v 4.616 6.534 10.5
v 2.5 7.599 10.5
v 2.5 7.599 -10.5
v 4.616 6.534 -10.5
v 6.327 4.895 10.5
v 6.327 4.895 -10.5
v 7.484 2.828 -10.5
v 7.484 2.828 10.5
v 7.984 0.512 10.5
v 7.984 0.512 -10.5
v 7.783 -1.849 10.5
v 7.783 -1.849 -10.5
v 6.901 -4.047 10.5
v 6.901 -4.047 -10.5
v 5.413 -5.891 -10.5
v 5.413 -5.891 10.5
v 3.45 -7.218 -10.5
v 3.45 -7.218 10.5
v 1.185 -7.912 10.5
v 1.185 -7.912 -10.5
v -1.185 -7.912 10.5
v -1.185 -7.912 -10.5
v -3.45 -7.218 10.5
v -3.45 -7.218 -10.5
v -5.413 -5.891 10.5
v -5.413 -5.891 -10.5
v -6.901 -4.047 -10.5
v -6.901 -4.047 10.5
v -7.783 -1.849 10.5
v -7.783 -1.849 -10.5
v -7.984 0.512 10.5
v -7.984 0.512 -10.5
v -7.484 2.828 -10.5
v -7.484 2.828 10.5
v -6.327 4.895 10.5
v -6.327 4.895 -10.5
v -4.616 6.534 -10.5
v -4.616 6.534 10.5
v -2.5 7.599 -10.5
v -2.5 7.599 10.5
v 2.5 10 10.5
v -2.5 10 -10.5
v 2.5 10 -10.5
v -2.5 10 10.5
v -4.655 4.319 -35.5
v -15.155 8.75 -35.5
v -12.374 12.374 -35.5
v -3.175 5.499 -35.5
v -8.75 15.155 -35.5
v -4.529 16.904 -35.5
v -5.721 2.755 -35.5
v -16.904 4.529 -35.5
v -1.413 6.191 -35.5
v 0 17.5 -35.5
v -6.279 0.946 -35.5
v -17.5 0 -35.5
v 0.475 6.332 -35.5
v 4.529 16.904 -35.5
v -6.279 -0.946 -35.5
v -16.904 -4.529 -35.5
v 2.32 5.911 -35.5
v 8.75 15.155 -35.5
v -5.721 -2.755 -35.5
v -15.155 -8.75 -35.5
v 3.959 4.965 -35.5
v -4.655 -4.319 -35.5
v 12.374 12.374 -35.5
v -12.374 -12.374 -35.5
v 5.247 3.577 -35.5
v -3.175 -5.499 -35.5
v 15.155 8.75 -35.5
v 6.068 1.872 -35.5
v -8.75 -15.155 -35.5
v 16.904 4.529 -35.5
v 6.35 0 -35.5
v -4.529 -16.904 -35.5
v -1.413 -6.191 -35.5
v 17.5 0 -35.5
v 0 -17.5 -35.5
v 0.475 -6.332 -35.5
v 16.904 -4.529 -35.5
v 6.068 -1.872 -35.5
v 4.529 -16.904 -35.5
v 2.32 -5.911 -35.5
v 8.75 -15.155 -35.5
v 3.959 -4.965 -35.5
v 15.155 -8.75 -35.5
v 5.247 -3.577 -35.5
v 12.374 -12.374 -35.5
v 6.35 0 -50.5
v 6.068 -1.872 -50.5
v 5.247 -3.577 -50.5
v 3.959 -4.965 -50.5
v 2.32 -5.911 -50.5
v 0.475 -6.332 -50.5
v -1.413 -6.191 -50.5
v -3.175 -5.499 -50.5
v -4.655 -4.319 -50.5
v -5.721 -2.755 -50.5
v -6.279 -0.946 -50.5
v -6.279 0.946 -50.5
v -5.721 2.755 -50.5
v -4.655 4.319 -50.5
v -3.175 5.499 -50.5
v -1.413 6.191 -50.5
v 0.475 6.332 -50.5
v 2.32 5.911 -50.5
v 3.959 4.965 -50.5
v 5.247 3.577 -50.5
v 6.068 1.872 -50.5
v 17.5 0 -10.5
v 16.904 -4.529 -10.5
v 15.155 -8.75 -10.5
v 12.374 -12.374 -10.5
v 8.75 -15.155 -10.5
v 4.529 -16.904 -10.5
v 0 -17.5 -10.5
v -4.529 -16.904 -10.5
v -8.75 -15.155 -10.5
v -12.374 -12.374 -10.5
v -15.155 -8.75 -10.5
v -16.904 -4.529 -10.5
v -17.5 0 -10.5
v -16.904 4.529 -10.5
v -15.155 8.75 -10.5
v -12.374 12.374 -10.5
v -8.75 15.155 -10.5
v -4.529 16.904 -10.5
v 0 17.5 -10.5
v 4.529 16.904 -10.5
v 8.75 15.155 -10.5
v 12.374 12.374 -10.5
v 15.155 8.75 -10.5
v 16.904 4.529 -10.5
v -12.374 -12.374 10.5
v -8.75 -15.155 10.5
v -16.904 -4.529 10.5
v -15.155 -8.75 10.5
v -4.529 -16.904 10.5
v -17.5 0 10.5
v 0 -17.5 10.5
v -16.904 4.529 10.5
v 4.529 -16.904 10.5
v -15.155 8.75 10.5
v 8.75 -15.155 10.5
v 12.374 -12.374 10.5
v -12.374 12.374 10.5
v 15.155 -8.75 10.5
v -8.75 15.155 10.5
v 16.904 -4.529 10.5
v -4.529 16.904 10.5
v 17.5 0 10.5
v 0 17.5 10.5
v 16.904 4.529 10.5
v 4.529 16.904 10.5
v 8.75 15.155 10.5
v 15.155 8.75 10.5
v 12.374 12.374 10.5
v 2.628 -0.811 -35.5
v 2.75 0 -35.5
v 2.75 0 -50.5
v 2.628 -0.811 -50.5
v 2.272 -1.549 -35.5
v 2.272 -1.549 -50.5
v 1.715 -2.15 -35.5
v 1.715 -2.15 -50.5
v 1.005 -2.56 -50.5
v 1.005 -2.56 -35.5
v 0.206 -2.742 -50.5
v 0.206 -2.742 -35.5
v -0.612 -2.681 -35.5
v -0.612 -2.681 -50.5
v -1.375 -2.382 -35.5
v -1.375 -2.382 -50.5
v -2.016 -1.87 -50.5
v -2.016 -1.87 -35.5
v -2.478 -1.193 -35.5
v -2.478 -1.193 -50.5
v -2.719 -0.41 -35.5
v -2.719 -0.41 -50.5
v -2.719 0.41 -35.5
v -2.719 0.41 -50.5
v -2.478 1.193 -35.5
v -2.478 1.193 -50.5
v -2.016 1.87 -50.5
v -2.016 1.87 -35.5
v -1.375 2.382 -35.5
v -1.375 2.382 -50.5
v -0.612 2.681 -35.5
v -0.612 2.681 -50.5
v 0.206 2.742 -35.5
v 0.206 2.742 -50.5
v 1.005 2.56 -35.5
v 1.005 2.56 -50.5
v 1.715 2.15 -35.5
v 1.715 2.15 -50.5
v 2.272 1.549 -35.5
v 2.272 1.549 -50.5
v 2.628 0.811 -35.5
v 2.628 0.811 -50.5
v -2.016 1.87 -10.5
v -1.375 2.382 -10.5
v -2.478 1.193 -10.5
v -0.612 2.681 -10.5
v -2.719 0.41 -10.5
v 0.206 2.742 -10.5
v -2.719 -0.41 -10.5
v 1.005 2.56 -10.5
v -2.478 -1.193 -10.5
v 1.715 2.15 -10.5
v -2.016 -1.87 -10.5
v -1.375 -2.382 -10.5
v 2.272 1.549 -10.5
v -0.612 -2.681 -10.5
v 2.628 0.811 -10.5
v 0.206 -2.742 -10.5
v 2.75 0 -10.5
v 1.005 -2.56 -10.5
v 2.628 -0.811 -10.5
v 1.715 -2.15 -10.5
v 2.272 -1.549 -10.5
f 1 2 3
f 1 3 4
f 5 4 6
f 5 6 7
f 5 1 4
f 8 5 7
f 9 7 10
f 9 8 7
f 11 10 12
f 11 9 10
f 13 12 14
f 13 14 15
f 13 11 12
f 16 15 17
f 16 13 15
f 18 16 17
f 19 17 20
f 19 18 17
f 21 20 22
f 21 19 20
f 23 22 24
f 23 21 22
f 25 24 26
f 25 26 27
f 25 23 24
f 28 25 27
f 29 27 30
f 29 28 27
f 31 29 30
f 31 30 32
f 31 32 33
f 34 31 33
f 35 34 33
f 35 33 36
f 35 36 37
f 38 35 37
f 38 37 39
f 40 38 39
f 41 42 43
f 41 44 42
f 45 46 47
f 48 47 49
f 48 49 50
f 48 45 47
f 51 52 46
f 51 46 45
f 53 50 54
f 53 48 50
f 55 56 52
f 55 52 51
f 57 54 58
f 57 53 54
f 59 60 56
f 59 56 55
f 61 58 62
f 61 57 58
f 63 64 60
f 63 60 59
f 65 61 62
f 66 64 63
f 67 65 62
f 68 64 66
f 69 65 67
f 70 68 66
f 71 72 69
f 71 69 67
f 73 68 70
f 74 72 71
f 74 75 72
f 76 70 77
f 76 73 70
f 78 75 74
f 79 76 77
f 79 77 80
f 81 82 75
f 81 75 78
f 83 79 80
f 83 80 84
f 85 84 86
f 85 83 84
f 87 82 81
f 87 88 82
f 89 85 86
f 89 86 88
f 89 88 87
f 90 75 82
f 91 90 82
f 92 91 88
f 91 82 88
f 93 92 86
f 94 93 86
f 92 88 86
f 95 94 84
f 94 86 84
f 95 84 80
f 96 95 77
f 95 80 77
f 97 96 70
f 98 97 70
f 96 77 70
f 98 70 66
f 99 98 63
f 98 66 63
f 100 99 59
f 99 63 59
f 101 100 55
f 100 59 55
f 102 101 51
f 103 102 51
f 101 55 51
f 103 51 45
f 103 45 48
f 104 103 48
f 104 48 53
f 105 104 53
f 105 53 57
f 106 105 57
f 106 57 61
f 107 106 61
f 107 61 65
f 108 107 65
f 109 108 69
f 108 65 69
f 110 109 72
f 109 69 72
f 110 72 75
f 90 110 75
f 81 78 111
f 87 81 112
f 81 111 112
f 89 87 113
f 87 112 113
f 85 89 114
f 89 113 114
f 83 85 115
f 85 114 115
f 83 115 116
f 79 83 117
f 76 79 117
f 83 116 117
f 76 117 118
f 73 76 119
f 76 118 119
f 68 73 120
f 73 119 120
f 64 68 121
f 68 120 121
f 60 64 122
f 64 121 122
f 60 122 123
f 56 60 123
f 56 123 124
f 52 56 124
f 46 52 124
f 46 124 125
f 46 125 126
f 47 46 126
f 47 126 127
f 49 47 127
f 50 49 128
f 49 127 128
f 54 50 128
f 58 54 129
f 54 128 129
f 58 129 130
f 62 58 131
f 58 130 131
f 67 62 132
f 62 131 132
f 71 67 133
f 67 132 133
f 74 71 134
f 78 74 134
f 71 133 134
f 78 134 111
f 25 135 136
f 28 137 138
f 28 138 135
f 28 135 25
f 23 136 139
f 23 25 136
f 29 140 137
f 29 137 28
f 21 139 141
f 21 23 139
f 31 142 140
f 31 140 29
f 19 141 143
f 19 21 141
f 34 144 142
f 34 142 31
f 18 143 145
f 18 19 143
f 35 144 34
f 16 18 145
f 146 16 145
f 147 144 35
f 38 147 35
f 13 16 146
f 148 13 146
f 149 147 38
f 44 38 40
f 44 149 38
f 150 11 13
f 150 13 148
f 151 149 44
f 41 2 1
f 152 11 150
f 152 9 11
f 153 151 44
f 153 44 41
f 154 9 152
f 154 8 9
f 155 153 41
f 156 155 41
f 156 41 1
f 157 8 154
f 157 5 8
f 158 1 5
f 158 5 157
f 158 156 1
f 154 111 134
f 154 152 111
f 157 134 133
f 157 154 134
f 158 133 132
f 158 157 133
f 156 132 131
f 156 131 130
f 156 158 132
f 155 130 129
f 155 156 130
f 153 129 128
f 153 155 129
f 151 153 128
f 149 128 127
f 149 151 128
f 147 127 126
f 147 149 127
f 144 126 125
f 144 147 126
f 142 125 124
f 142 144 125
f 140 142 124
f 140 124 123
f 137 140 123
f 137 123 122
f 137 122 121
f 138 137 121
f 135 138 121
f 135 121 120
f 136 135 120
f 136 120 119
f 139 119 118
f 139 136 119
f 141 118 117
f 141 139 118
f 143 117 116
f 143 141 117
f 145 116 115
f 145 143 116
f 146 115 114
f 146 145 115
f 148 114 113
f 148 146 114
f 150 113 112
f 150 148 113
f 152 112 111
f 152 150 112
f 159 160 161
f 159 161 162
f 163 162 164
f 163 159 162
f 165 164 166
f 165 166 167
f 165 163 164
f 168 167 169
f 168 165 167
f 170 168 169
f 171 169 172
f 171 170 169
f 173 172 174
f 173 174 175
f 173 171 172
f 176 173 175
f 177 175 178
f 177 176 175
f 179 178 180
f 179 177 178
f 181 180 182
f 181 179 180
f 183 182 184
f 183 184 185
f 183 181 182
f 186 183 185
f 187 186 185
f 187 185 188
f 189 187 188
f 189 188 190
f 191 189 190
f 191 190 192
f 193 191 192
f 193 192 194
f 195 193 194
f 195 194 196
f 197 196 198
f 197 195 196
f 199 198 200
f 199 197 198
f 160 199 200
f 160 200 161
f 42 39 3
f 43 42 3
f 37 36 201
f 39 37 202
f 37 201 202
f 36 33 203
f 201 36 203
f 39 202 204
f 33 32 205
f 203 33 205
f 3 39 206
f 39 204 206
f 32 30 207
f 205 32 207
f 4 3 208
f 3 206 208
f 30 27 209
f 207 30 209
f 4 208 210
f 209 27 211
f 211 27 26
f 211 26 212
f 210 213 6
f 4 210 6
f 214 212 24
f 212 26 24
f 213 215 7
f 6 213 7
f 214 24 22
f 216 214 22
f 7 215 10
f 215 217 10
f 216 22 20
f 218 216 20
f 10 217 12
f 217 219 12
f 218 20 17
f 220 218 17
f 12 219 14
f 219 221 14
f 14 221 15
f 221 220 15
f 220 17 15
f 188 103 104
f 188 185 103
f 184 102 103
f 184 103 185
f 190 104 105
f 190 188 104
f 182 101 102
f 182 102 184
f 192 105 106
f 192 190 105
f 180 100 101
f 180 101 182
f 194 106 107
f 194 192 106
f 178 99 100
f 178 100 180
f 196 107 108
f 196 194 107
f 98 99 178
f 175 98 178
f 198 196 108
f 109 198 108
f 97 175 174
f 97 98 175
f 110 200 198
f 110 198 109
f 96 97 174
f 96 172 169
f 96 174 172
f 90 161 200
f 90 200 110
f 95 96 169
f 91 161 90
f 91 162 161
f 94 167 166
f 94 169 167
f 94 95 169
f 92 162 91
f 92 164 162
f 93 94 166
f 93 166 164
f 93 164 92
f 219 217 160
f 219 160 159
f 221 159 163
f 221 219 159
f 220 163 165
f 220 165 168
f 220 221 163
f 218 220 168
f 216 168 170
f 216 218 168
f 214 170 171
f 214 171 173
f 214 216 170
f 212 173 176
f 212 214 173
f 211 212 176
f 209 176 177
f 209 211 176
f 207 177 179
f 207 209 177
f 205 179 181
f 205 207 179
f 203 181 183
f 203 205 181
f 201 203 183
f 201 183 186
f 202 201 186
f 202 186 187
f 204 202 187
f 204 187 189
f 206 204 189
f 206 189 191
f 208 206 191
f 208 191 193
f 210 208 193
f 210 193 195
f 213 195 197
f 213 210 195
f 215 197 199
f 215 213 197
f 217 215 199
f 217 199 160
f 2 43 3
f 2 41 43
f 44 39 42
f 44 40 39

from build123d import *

# Parameters (mm, degrees)
F0_R     = 17.5
F1_DEPTH = 10.5
F2_R     = 17.5
F2_R_2   = 2.75
F3_DEPTH = 25
F4_R     = 6.35
F4_R_2   = 2.75
F5_DEPTH = 15


with BuildPart() as f1:
    # F0 (on Top) → F1 (new body, symmetric)
    with BuildSketch(Plane.XY):
        Circle(F0_R)
        with BuildLine():
            ThreePointArc((2.5, 7.5993420768), (0, -8), (-2.5, 7.5993420768))
            Line((-2.5, 7.5993420768), (-2.5, 10))
            Line((-2.5, 10), (2.5, 10))
            Line((2.5, 10), (2.5, 7.5993420768))
        make_face(mode=Mode.SUBTRACT)
    extrude(amount=F1_DEPTH, both=True)

    # F2 (on face) → F3 (join)
    with BuildSketch(Plane(origin=(0, 0, -10.5), x_dir=(1, 0, 0), z_dir=(0, 0, -1))):
        Circle(F2_R)
        with BuildLine():
            Line((-2.5, -10), (-2.5, -7.5993420768))
            ThreePointArc((-2.5, -7.5993420768), (0, 8), (2.5, -7.5993420768))
            Line((2.5, -7.5993420768), (2.5, -10))
            Line((2.5, -10), (-2.5, -10))
        make_face(mode=Mode.SUBTRACT)
        with BuildLine():
            ThreePointArc((2.5, -7.5993420768), (0, 8), (-2.5, -7.5993420768))
            Line((-2.5, -7.5993420768), (-2.5, -10))
            Line((-2.5, -10), (2.5, -10))
            Line((2.5, -10), (2.5, -7.5993420768))
        make_face()
        Circle(F2_R_2, mode=Mode.SUBTRACT)
    extrude(amount=F3_DEPTH)

    # F4 (on face) → F5 (join)
    with BuildSketch(Plane(origin=(0, 0, -35.5), x_dir=(1, 0, 0), z_dir=(0, 0, -1))):
        Circle(F4_R)
        Circle(F4_R_2, mode=Mode.SUBTRACT)
    extrude(amount=F5_DEPTH)


solid = f1.part
